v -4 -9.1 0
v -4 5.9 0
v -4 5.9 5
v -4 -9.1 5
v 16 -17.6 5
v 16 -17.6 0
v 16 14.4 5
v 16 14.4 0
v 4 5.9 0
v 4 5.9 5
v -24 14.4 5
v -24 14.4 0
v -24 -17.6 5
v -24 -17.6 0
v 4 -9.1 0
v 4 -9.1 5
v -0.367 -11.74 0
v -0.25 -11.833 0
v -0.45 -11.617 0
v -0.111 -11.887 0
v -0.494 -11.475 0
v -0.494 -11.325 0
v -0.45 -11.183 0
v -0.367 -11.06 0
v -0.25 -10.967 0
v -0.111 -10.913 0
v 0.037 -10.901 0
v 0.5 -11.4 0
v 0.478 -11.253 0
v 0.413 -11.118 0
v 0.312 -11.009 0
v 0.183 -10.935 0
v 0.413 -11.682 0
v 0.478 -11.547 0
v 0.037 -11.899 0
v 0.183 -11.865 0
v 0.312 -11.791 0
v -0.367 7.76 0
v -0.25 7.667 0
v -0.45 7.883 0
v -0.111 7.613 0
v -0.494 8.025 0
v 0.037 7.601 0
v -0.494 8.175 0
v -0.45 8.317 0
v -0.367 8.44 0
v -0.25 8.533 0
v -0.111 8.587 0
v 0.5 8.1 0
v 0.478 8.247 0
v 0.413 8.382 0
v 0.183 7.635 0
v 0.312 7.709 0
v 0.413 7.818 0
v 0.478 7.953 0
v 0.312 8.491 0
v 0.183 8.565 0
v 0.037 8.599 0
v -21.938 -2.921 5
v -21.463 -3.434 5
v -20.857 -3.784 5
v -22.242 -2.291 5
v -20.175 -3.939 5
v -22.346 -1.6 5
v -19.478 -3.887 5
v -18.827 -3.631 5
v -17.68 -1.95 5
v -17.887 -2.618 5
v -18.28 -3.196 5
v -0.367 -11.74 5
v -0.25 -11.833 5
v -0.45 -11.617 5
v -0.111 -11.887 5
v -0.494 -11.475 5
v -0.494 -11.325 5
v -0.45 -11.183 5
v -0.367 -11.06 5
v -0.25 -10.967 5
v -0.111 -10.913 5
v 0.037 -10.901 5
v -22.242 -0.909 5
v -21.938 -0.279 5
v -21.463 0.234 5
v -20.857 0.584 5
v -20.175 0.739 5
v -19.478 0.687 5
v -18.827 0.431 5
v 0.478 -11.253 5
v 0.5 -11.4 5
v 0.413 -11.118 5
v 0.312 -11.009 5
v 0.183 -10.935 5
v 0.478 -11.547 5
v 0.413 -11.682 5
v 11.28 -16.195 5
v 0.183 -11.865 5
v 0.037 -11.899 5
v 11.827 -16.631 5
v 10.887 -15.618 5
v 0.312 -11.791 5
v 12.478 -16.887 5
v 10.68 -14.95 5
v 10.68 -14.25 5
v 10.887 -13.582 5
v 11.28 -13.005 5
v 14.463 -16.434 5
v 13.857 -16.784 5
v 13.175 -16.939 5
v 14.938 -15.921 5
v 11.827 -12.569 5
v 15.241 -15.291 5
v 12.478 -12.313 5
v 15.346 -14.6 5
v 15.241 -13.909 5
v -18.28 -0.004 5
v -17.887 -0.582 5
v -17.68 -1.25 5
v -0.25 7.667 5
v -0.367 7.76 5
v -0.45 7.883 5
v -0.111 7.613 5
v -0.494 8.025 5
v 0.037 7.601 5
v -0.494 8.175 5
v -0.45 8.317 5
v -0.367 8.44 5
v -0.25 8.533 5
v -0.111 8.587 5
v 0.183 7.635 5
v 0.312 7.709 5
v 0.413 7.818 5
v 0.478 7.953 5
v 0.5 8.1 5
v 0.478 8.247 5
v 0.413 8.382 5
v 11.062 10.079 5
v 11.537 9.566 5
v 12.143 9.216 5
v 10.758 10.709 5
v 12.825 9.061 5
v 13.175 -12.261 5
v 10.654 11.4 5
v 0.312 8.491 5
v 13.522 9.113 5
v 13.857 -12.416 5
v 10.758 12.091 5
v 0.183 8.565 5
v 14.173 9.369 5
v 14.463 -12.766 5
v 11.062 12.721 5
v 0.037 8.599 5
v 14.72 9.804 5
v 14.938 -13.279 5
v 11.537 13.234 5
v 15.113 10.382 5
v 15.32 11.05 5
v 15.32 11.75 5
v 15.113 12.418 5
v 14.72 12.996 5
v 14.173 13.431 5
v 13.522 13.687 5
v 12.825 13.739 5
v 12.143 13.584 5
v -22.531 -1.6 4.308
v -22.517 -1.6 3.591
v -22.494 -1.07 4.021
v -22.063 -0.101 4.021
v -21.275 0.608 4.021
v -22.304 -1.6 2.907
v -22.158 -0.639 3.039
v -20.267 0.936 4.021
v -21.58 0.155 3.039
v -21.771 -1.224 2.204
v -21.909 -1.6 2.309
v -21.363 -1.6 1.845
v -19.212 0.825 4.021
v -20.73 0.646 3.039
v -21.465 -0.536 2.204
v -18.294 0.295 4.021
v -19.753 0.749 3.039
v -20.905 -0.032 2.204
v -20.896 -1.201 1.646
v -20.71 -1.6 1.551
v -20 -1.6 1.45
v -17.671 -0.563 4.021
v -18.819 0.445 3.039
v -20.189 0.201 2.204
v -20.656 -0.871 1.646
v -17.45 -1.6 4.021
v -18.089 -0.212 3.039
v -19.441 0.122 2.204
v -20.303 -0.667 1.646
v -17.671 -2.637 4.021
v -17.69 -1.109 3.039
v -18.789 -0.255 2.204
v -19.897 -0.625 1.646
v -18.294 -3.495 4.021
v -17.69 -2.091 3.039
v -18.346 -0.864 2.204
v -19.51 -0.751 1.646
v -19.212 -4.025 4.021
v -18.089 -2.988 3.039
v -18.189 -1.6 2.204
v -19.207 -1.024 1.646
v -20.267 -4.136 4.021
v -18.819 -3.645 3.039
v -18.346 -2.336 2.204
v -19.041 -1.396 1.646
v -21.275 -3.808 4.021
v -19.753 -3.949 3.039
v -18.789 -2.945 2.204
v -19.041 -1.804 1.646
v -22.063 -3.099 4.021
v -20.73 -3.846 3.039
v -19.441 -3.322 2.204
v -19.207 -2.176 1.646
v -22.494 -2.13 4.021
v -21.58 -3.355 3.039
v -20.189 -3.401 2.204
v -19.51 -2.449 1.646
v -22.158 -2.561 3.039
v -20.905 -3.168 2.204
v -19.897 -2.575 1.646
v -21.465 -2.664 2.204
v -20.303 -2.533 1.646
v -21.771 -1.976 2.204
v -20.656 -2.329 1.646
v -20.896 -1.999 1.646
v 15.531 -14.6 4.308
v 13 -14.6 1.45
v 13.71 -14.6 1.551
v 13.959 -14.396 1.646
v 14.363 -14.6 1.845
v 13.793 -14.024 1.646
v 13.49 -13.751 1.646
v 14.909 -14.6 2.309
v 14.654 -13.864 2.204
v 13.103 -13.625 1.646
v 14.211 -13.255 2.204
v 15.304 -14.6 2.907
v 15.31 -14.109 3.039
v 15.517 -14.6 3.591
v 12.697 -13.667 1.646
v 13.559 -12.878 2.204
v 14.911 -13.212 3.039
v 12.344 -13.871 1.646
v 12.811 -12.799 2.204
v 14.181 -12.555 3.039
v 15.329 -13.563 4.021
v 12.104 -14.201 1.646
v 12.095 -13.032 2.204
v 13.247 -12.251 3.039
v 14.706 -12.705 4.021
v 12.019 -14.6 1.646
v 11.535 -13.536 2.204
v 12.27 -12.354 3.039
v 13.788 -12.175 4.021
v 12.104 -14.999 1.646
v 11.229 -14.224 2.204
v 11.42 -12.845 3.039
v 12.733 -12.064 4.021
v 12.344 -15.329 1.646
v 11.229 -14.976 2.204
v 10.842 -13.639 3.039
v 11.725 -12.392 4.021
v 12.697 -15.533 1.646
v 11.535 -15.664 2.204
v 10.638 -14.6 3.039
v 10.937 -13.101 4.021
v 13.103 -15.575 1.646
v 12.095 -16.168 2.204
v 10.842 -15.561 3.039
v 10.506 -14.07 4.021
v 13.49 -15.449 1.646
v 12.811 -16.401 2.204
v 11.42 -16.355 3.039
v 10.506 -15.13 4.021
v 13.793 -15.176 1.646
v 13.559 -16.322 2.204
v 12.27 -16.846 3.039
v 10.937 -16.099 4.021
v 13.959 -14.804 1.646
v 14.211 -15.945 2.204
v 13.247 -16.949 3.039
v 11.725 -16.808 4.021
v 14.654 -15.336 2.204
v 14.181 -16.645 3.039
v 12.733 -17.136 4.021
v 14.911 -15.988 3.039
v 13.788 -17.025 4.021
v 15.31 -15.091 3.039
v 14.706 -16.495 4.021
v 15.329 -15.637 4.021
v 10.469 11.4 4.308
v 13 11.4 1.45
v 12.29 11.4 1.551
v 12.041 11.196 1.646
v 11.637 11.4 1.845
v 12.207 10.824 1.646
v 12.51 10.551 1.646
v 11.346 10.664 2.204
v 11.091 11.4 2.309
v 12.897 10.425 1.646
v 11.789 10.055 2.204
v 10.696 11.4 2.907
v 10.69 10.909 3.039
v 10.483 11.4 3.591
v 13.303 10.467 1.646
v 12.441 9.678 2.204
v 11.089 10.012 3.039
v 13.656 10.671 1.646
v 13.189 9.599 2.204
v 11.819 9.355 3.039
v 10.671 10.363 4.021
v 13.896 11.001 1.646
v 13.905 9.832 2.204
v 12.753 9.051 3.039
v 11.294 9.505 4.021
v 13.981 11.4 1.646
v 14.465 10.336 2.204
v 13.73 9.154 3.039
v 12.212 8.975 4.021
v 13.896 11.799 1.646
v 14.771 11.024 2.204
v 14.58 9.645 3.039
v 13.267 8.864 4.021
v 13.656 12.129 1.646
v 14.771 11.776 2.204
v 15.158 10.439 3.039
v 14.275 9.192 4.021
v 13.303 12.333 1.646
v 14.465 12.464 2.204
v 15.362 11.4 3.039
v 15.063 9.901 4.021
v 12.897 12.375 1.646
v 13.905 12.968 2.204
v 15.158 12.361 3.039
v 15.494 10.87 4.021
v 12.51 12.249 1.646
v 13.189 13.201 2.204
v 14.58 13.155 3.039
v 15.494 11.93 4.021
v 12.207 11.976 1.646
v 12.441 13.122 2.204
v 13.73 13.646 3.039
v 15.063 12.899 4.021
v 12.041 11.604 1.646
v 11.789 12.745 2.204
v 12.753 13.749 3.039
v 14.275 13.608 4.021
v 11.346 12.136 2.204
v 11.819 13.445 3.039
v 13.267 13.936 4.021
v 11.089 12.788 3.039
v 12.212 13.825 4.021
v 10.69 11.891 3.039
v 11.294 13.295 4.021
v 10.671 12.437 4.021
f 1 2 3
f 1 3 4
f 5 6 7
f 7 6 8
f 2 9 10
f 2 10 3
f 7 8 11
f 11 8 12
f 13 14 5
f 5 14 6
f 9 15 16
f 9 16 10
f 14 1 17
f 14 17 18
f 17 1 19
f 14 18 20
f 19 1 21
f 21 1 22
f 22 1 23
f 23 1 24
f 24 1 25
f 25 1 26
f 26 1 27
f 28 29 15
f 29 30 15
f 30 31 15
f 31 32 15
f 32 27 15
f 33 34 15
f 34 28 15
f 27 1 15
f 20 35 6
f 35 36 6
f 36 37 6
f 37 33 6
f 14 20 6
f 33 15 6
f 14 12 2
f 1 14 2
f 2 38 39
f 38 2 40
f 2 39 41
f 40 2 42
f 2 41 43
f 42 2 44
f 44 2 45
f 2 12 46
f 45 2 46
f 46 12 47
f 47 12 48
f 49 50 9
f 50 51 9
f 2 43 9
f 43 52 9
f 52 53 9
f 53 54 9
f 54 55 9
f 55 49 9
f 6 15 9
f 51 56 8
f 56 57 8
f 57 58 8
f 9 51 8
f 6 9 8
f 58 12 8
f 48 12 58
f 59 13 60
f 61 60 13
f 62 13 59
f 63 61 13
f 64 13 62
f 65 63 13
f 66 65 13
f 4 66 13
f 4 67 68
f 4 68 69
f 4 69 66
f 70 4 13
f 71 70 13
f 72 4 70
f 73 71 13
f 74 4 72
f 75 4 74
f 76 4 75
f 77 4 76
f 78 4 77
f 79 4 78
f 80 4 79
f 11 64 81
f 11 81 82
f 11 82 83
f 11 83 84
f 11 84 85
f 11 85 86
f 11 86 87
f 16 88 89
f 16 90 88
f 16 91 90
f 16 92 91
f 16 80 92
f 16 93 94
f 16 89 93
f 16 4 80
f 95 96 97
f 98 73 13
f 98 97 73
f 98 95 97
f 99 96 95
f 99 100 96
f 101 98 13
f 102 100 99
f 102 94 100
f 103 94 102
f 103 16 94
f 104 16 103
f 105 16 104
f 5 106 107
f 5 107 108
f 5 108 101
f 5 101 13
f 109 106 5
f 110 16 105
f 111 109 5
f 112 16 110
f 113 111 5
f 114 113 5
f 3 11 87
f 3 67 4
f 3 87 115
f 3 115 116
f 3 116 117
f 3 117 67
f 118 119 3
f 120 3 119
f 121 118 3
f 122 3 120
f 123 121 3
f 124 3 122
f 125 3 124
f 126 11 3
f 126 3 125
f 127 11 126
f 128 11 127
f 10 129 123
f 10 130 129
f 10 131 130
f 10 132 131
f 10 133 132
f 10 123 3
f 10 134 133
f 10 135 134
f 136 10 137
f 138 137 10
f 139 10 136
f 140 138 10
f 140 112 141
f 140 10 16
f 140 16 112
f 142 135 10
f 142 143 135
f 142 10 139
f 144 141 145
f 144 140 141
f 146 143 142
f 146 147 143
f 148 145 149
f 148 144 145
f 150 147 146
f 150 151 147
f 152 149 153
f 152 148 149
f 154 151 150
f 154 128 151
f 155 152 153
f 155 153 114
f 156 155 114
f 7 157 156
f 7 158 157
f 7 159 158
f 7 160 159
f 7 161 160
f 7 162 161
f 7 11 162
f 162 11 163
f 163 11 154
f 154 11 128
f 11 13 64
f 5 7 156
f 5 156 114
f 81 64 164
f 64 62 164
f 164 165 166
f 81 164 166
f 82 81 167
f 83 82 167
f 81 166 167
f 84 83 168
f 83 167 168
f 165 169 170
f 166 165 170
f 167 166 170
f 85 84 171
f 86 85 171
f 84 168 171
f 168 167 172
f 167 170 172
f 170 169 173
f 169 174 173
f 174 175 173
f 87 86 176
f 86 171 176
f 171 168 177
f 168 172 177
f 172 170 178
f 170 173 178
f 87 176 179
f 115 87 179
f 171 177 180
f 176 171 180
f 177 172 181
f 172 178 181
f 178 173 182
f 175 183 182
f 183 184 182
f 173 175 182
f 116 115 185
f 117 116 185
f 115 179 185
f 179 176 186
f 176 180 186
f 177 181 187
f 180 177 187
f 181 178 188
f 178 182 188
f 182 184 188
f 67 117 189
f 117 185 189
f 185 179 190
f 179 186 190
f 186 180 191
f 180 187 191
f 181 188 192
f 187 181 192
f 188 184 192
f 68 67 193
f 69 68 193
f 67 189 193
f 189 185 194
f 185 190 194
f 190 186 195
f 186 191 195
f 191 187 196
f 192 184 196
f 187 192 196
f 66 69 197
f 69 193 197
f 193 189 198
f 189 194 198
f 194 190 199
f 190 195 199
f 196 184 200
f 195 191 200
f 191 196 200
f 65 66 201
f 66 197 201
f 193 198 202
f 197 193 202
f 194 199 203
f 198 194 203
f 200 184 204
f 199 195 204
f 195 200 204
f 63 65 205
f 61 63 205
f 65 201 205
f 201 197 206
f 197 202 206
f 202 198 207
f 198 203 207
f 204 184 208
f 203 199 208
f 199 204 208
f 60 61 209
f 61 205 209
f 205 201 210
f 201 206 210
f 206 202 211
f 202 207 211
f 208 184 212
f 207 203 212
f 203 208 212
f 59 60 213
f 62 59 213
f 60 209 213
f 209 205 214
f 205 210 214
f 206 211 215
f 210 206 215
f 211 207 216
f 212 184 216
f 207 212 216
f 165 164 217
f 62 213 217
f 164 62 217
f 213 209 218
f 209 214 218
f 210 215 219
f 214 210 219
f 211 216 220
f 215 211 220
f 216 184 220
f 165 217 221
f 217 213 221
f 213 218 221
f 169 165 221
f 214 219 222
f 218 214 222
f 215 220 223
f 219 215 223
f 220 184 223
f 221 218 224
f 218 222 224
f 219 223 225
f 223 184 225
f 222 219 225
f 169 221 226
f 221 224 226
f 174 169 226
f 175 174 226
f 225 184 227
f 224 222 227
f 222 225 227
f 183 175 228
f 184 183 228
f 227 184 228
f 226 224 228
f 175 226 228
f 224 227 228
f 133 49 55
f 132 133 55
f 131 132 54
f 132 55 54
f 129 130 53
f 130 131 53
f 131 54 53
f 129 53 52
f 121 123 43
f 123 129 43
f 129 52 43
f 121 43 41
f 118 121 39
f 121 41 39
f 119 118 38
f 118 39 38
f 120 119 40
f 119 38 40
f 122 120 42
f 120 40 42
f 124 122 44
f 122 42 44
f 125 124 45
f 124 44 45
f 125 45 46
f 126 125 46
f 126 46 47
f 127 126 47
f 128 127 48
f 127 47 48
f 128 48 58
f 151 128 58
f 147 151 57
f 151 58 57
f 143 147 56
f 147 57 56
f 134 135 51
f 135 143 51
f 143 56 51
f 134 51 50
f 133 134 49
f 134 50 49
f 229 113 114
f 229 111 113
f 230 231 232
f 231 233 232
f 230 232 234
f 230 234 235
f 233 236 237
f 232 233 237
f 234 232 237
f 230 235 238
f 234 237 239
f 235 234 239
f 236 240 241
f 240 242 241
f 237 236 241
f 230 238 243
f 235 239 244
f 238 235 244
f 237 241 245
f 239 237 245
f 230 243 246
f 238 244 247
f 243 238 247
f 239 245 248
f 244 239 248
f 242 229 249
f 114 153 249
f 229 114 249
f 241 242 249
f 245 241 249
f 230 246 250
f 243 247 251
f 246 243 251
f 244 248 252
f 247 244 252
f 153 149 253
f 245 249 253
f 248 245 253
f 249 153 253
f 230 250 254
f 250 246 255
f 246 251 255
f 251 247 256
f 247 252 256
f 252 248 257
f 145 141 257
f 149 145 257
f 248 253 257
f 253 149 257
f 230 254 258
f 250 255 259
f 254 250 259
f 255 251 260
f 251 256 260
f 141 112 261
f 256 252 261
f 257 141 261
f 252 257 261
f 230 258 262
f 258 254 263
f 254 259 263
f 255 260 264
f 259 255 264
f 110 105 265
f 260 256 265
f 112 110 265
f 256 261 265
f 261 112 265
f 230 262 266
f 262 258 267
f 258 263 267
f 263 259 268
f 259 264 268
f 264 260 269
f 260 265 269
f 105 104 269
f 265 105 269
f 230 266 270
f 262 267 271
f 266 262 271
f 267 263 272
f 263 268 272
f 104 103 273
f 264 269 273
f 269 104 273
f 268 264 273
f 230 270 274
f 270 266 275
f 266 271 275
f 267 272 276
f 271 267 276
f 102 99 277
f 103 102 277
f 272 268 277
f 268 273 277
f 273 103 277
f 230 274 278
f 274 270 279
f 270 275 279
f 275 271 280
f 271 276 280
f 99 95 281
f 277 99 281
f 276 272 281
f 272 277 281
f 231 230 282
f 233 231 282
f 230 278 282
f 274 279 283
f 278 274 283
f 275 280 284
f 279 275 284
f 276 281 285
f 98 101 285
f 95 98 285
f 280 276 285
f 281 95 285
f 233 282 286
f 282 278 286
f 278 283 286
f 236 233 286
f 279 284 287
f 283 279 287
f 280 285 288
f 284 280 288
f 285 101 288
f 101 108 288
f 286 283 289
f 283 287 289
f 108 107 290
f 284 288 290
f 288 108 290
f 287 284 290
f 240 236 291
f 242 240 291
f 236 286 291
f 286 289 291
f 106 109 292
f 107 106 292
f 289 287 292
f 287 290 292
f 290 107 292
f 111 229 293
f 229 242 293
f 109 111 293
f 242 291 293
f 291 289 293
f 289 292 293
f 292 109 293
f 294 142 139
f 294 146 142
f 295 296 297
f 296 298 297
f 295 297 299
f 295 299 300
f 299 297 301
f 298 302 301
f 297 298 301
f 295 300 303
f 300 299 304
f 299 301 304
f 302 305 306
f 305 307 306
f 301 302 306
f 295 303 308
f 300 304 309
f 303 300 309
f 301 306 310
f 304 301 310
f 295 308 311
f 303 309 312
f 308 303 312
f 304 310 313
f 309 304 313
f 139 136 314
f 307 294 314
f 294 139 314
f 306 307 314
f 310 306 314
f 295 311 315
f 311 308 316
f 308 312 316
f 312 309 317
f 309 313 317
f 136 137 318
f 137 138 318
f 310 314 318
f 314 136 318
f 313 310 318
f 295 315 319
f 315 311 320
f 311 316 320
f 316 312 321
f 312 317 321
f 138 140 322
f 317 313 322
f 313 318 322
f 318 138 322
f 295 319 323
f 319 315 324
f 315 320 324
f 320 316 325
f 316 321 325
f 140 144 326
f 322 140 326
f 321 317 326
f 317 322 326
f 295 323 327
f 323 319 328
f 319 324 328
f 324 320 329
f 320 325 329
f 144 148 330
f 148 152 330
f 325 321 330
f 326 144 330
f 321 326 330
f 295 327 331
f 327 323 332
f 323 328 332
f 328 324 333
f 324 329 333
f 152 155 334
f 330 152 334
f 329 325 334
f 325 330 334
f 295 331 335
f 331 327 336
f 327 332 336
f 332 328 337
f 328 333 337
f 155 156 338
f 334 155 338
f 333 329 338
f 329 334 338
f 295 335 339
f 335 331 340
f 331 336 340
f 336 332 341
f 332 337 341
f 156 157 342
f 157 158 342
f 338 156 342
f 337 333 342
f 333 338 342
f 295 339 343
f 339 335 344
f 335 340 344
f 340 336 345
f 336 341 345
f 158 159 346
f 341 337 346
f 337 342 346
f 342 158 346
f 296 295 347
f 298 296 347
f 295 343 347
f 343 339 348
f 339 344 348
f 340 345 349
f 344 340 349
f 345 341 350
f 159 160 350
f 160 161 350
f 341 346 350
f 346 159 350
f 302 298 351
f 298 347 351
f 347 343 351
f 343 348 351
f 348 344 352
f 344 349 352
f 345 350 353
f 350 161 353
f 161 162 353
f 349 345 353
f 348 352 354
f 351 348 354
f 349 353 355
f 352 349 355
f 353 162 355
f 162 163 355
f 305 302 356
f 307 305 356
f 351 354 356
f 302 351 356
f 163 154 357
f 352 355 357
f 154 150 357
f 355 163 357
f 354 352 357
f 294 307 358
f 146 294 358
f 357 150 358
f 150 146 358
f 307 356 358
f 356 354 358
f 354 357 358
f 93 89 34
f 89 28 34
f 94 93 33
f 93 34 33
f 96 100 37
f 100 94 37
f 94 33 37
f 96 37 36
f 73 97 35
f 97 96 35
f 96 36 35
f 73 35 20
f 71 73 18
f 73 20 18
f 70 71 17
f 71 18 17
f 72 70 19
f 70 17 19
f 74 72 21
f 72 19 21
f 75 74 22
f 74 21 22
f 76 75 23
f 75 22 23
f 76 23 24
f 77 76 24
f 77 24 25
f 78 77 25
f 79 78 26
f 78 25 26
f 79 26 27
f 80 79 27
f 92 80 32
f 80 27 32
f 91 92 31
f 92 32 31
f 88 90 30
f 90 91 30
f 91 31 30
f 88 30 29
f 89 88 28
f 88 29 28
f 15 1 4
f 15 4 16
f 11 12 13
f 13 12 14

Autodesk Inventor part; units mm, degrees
ref_plane "YZ Plane" through (0, 0, 0) normal (1, 0, 0) x (0, 1, 0)
ref_plane "XZ Plane" through (0, 0, 0) normal (0, 1, 0) x (-1, 0, 0)
ref_plane "XY Plane" through (0, 0, 0) normal (0, 0, 1) x (1, 0, 0)
ref_plane "Work Plane1" through (0, 0, 0) normal (0, 0, 1) x (1, 0, 0)
sketch "Sketch1" plane through (0, 0, 0) normal (0, 0, 1) x (1, 0, 0)
  circle A0 centre (0, -11.4) radius 0.5 construction
  circle A1 centre (0, 8.1) radius 0.5 construction
  circle A2 centre (0, -1.6) radius 3.9462 construction
  line L0 (8.2, 14.1) -> (-8.2, 14.1) construction
  line L1 (-8.2, 14.1) -> (-8.2, -14.1) construction
  line L2 (-8.2, -14.1) -> (8.2, -14.1) construction
  line L3 (8.2, -14.1) -> (8.2, 14.1) construction
  line L4 (-4, -9.1) -> (4, -9.1)
  line L5 (4, -9.1) -> (4, 5.9)
  line L6 (4, 5.9) -> (-4, 5.9)
  line L7 (-4, 5.9) -> (-4, -9.1)
  line L8 (-4, -9.1) -> (4, 5.9) construction
  line L9 (4, -9.1) -> (-4, 5.9) construction
  circle A3 centre (13, 11.4) radius 1.45 construction
  circle A4 centre (13, -14.6) radius 1.45 construction
  circle A5 centre (-20, -1.6) radius 1.45 construction
  line L10 (16, -17.6) -> (16, 14.4) construction
  line L11 (16, 14.4) -> (-16, 14.4) construction
  line L12 (-16, -17.6) -> (16, -17.6) construction
  line L13 (16, 14.4) -> (-24, 14.4)
  line L14 (-24, 14.4) -> (-24, -17.6)
  line L15 (-24, -17.6) -> (16, -17.6)
  line L16 (16, -17.6) -> (16, 14.4)
  circle A6 centre (0, 8.1) radius 0.5
  circle A7 centre (0, -11.4) radius 0.5
  point P0 (0, 0)
extrude "Extrusion1" add sketch "Sketch1" along normal blind 5
ref_plane "Work Plane2" through (-24, -1.6, 0) normal (0, -1, 0) x (1, 0, 0)
sketch "Sketch2" plane through (-24, -1.6, 0) normal (0, -1, 0) x (1, 0, 0)
  line L0 (1, 9) -> (1, 5)
  line L1 (7, 9) -> (7, 5)
  circle A0 centre (4, 4) radius 2.55
  line L2 (4, 6.55) -> (4, 1.45)
  point P0 (24, 0)
  dimension "d6" = 5.1
  dimension "d7" = 3
  dimension "d8" = 1
revolve "Revolution1" cut sketch "Sketch2" angle 360 about axis through (-20, -1.6, 6.55) along (0, 0, -1) picked at (3.097, 3.5418) contours L2 A0
sketch "Sketch3" plane through (0, 0, 5) normal (0, 0, 1) x (1, 0, 0)
  circle A0 centre (13, -14.6) radius 1.45 projected
  circle A1 centre (13, 11.4) radius 1.45 projected
  circle A2 centre (-20, -1.6) radius 1.45 projected
  point P0 (0, 0)
ref_plane "Work Plane3" through (13, 11.4, 5) normal (0, 1, 0) x (1, 0, 0)
sketch "Sketch4" plane through (13, 11.4, 5) normal (0, 1, 0) x (1, 0, 0)
  circle A0 centre (0, 1) radius 2.55
  line L0 (-37, 0) -> (3, 0) projected
  line L1 (0, -4) -> (0, 0) projected
  line L2 (0, 0) -> (0, 3.55)
  line L3 (0, -1.55) -> (0, 0)
  point P0 (-13, 5)
  dimension "d10" = 5.1
  dimension "d11" = 1
  dimension "d12" = 0
revolve "Revolution2" cut sketch "Sketch4" angle 360 about axis through (13, 11.4, 5) along (0, 0, -1) picked at (-0.2076, 2.3409) picked at (-1.4654, -0.1719) contours L2 L0 A0 | L0 L1 A0
ref_plane "Work Plane4" through (13, -14.6, 5) normal (0, -1, 0) x (1, 0, 0)
sketch "Sketch5" plane through (13, -14.6, 5) normal (0, -1, 0) x (1, 0, 0)
  line L0 (0, 4) -> (0, 0) projected
  arc A0 (0, -3.55) -> (0, 1.55) centre (0, -1) ccw
  line L1 (0, 1.55) -> (0, -3.55)
  arc A1 (-2.3457, 0) -> (2.3457, 0) centre (0, -1) ccw projected
  point P0 (-13, -5)
  dimension "d14" = 5.1
  dimension "d15" = 1
revolve "Revolution3" cut sketch "Sketch5" angle 360 about axis through (13, -14.6, 9) along (0, 0, -1)
properties part number "05_Adapterplate_LG_CRD_8521B"
